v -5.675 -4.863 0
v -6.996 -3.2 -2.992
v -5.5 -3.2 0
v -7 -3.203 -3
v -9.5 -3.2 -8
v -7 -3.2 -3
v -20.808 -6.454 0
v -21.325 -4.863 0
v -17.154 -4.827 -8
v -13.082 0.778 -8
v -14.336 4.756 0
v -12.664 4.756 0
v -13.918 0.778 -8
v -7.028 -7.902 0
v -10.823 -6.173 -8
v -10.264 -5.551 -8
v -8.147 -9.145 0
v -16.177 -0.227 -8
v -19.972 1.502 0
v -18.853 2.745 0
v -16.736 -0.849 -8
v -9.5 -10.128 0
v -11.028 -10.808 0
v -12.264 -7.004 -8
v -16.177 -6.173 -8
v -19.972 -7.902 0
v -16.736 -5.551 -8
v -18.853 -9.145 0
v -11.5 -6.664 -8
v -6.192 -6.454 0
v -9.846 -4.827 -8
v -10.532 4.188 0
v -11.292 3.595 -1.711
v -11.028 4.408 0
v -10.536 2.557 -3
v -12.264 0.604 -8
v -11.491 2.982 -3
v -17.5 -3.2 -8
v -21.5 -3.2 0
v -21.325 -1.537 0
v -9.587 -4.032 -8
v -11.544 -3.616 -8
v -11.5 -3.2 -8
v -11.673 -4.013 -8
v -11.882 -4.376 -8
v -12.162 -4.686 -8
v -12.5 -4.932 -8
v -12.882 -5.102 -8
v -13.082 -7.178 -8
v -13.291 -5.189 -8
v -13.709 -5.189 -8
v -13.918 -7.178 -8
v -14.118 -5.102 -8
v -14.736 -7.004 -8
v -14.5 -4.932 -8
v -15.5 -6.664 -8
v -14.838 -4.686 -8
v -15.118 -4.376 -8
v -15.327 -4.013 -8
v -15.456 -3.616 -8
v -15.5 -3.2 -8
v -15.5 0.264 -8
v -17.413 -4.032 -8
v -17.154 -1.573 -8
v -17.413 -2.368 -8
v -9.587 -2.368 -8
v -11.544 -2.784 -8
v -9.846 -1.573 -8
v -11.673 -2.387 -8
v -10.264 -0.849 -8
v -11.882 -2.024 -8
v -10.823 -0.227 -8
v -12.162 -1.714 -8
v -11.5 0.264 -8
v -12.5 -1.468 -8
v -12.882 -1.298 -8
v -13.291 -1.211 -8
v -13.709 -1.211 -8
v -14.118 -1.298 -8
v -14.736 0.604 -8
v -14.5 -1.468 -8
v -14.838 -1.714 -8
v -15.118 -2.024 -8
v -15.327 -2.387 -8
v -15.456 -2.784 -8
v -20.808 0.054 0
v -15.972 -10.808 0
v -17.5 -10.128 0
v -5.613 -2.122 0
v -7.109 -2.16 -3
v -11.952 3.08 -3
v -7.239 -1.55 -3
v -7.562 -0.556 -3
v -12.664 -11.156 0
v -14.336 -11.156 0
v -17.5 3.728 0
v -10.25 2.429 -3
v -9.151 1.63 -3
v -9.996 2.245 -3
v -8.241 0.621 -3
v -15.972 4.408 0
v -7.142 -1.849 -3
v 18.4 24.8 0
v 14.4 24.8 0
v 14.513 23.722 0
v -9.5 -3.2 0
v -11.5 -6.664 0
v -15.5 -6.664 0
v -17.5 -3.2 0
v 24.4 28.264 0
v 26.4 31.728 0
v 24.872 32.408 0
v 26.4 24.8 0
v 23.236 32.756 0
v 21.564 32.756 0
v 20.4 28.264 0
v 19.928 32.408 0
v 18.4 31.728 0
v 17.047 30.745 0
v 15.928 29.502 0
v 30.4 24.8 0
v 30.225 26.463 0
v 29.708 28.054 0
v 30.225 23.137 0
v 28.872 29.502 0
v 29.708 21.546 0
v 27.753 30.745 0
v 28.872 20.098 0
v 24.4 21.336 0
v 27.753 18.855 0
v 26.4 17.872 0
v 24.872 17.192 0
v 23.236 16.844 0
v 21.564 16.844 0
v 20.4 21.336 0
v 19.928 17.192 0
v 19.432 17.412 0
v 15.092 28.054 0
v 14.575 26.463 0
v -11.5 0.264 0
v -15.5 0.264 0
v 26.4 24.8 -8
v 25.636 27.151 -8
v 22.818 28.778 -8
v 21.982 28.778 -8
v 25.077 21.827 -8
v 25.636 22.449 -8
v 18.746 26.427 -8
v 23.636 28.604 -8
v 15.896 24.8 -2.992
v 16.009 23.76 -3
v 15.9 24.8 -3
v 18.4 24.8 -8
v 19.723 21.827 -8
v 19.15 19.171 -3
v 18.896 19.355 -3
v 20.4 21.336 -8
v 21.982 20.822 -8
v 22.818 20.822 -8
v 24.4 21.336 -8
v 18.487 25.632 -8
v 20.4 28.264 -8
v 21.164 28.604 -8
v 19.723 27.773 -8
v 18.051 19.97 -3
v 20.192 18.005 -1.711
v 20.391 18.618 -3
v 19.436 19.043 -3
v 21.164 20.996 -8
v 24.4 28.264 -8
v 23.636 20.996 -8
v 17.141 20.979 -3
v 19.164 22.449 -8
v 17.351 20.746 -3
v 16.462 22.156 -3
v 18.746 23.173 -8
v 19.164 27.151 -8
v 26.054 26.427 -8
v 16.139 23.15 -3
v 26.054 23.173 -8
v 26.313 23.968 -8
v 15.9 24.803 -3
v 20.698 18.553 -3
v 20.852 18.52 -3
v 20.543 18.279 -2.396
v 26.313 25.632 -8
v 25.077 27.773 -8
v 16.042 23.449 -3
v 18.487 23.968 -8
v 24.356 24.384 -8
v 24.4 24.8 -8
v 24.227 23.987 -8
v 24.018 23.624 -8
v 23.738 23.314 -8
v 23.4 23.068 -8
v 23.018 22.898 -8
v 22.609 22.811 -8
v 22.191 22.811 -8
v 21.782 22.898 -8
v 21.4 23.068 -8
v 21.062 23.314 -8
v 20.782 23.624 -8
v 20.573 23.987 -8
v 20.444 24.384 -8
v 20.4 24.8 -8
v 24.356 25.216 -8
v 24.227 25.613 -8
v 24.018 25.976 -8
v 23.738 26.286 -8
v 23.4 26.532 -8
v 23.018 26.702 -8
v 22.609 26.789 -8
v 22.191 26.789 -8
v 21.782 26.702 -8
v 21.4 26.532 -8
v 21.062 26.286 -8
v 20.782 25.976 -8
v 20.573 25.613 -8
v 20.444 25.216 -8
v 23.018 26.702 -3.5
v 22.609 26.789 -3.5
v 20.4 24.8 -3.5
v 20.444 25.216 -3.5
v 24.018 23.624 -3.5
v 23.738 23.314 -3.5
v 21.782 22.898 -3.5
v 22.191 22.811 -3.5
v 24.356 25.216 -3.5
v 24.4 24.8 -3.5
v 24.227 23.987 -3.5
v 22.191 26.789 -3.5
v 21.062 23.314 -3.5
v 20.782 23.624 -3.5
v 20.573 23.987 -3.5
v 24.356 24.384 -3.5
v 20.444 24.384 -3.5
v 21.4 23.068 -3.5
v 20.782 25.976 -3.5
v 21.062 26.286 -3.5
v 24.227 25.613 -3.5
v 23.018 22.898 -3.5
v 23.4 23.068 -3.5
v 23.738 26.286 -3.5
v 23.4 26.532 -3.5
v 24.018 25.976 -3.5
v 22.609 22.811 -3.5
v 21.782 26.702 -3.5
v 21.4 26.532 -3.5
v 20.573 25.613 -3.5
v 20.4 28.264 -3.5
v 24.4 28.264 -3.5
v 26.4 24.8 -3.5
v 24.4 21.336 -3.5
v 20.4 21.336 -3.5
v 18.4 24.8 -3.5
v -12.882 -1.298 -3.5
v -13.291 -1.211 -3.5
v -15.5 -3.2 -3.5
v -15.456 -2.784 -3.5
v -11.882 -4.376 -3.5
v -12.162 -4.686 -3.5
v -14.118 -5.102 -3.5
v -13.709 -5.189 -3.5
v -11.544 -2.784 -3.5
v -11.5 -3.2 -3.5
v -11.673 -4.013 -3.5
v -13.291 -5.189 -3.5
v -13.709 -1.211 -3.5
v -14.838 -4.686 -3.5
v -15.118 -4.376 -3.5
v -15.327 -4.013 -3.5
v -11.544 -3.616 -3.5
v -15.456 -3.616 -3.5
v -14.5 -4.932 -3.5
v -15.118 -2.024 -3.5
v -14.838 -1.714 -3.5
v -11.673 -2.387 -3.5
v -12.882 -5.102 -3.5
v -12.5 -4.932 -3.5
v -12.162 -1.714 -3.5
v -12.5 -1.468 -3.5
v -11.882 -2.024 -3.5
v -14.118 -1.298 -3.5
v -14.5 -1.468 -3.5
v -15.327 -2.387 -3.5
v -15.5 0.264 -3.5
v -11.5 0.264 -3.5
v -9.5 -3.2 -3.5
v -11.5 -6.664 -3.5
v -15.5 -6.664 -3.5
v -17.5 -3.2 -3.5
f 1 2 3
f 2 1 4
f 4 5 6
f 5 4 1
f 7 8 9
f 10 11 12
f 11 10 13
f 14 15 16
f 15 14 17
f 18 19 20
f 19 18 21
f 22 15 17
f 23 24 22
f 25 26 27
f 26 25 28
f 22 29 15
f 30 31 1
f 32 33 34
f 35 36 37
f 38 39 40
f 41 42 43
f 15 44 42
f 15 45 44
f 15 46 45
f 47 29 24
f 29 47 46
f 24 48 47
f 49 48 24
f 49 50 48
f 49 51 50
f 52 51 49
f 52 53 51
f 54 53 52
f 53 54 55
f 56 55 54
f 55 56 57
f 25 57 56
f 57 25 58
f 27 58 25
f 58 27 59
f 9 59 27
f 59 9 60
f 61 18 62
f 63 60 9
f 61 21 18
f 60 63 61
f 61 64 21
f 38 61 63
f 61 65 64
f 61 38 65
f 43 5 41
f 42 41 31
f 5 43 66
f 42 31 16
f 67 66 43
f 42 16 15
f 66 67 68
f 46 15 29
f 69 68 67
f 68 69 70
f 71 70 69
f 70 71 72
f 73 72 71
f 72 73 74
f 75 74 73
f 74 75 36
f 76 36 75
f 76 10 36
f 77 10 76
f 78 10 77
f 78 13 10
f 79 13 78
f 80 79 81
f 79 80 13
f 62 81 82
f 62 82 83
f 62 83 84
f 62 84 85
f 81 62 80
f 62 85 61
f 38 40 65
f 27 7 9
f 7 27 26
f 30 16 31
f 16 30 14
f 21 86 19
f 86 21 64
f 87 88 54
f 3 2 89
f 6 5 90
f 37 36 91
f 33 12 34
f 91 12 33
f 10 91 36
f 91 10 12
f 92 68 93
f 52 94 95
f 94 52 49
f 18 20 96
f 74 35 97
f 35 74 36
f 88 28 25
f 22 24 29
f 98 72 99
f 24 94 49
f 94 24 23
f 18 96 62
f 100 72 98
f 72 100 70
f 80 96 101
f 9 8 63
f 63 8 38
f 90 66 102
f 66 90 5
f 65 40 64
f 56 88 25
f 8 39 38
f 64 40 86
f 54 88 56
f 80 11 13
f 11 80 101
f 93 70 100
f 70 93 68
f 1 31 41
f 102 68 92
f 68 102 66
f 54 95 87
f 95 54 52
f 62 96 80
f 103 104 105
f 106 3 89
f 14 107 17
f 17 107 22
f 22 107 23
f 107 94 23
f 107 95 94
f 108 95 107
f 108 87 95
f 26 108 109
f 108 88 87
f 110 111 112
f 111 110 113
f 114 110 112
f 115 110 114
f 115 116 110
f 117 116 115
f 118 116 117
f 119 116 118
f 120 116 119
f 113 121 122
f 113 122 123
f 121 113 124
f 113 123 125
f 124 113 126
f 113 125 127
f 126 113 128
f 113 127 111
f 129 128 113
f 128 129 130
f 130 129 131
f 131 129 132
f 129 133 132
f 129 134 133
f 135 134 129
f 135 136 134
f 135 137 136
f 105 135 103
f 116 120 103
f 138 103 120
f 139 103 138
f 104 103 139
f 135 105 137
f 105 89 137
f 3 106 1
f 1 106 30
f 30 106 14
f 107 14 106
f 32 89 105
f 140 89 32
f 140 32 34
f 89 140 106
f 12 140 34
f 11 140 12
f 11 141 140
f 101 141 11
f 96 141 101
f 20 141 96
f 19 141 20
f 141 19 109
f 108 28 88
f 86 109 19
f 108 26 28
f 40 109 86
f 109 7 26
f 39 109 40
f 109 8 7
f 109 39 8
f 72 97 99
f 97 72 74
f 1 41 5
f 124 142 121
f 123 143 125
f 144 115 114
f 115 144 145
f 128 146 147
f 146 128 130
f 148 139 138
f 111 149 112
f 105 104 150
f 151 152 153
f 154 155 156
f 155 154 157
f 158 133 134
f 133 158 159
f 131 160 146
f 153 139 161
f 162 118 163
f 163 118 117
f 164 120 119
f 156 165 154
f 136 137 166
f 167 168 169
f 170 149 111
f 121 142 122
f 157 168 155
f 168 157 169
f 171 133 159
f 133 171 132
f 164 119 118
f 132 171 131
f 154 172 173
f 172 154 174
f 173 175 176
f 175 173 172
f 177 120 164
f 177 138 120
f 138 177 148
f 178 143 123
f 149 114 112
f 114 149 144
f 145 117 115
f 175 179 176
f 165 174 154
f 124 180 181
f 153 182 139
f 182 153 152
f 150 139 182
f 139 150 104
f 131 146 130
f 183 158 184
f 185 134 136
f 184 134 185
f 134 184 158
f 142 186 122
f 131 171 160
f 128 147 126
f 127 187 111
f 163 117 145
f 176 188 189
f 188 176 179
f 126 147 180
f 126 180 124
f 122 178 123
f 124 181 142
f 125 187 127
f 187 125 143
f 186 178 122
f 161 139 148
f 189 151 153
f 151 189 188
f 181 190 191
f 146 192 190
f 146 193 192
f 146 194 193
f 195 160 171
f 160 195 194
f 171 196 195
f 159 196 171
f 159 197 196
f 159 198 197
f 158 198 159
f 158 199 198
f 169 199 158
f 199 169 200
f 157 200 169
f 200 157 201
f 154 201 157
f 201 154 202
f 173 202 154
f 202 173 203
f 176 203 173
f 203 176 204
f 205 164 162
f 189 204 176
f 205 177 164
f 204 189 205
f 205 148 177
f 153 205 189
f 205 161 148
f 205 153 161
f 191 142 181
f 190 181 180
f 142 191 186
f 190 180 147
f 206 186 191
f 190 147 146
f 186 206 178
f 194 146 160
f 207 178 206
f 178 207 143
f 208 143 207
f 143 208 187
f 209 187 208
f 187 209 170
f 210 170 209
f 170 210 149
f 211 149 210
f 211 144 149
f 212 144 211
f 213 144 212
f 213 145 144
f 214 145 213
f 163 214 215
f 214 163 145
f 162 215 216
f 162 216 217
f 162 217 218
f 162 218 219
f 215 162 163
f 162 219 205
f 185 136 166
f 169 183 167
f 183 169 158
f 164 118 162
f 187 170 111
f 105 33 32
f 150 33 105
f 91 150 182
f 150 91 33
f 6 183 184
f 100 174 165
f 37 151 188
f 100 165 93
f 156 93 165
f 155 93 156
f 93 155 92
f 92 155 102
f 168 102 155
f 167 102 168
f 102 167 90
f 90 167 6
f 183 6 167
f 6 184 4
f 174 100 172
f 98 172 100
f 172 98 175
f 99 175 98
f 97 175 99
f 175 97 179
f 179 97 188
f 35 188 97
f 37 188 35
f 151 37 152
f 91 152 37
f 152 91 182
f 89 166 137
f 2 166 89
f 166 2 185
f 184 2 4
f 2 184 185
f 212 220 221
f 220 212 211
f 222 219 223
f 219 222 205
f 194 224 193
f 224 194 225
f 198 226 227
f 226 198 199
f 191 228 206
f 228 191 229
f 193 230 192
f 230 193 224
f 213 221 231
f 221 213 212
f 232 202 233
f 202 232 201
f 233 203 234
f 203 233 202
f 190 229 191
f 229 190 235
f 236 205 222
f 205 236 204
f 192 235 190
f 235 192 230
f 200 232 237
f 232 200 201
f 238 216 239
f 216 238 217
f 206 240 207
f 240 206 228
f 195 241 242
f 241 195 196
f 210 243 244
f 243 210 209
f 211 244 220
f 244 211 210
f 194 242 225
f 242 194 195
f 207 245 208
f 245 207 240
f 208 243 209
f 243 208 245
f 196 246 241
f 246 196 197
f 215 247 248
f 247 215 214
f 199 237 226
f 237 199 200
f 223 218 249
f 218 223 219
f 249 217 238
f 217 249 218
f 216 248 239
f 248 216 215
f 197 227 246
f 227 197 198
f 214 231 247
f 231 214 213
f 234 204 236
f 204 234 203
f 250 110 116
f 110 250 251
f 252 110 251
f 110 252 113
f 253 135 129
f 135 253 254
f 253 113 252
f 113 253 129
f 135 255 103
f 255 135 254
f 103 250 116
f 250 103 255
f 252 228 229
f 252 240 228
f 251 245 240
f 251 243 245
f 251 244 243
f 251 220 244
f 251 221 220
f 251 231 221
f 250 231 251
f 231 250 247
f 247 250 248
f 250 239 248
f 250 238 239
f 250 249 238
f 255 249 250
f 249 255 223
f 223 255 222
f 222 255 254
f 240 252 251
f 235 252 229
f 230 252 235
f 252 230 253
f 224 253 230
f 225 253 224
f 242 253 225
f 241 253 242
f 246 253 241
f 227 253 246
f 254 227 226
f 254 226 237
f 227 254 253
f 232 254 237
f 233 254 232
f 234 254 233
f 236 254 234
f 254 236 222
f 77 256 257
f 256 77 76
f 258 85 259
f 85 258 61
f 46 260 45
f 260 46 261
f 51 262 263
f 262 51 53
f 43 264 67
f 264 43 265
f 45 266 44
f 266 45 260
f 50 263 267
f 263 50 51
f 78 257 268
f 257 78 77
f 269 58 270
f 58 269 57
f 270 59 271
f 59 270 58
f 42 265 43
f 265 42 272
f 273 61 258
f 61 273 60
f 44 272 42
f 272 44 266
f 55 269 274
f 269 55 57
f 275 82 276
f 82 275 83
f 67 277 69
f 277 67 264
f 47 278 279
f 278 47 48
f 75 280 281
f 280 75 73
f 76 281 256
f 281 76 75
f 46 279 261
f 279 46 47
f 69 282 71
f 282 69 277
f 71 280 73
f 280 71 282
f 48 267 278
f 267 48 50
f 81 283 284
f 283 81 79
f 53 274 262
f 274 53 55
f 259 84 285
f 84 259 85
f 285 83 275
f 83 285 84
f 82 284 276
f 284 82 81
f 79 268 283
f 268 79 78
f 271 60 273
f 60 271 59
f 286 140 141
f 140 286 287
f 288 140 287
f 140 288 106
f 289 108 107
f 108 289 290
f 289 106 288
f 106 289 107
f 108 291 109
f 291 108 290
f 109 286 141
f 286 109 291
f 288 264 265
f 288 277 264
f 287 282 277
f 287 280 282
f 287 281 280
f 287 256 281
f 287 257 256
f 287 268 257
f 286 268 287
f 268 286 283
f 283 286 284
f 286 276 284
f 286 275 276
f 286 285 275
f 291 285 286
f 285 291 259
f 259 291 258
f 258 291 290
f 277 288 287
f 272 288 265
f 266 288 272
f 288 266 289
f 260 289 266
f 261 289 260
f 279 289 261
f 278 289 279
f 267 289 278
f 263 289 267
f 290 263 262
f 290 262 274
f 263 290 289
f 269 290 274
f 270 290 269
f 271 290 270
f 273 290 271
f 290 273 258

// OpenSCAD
insetHeight = 0.8;
height = 8;
botHeight = 8;
watchHeight = 5;

module cutout(){
    circle(d=1.5);
    translate([1.75, 0,0])
    circle(d=1.5);
    translate([4.47, -2.85,0])
    circle(d=1.5);
    translate([-4.43, -19.14,0]){
        circle(d=1.5);
        translate([17.7, 0,0])
        circle(d=1.5);
    }
}

    offsetY=-3.2;
    offsetX=-7.5;
    width= 6;
    innerWidth=23.9;
    innerHeight=16;

module lowBlock() {

    translate([offsetX,offsetY,0]){
        translate([-width,0,0])
        square([innerWidth+width*2,width]);
        translate([-width,-innerHeight-width,0])
        square([innerWidth+width*2,width]);
        translate([-width,-innerHeight,0])
        square([width,innerHeight]);
        translate([innerWidth,-innerHeight,0])
        square([width,innerHeight]);
    }
}

module medBlock() {

    
    insetTop=1.5;
    insetLeft=1.5;
    insetRight=1.5;
    insetBottom=1.5;
    translate([offsetX,offsetY,0]){
        translate([-width,-insetTop,0])
        square([innerWidth+width*2,width+insetTop]);
        translate([-width,-innerHeight-width,0])
        square([innerWidth+width*2,width+insetBottom]);
        translate([-width,-innerHeight,0])
        square([width+insetLeft,innerHeight]);
        translate([innerWidth-insetRight,-innerHeight,0])
        square([width+insetRight,innerHeight]);
    }
}

module holder() {
    translate([offsetX-width,-offsetY,0]){
    difference(){
     cylinder(h=8,r=4);
        union(){
        cylinder(h=8,r=2);
            translate([0,0,6])
            cylinder(h=2,r1=2,r2=4);
        }
    }
}
}



module topPart(){

rotate([180,0,0]){
    
    difference(){
        union(){
            translate([offsetX-width,-offsetY,0]){
            cylinder(h=8,r=4);
            translate([innerWidth+width*2,-innerHeight-width*2,0])
            cylinder(h=8,r=4);
            }
        
    translate([0,0,insetHeight])
    linear_extrude(height = height-insetHeight){
        difference(){
            medBlock();
            cutout();
        }
    }

    linear_extrude(height = insetHeight){
        difference(){
            lowBlock();
            cutout();
        }
    }
}
    translate([offsetX-width,-offsetY,0]){
        cylinder(h=8,r=2);
            translate([0,0,6])
            cylinder(h=2,r1=2,r2=4);
        translate([innerWidth+width*2,-innerHeight-width*2,0]){ cylinder(h=8,r=2);
            translate([0,0,6])
            cylinder(h=2,r1=2,r2=4);}
    }
}
}
}

module botPart(){
rotate([180,0,0])
    difference(){
        union(){
            translate([offsetX-width,-offsetY,0]){
            cylinder(h=botHeight,r1=8,r2=4);
            translate([innerWidth+width*2,-innerHeight-width*2,0])
            cylinder(h=botHeight,r1=8,r2=4);
            rotate(-180+atan((innerWidth+width*2)/(innerHeight+width*2)), [0,0,1])
            translate([-4,0,0])
            cube([8,sqrt((innerWidth+width*2)^2+(innerHeight+width*2)^2),botHeight-watchHeight]);
            }
}
    translate([offsetX-width,-offsetY,0]){
        cylinder(h=8,r=2);
            translate([0,0,0])
            cylinder($fn=6,h=3.5,r=4);
        translate([innerWidth+width*2,-innerHeight-width*2,0]){ cylinder(h=8,r=2);
            translate([0,0,0])
            cylinder($fn=6,h=3.5,r=4);}
    }
}
}


%topPart();
botPart();
$fs = 0.1;
